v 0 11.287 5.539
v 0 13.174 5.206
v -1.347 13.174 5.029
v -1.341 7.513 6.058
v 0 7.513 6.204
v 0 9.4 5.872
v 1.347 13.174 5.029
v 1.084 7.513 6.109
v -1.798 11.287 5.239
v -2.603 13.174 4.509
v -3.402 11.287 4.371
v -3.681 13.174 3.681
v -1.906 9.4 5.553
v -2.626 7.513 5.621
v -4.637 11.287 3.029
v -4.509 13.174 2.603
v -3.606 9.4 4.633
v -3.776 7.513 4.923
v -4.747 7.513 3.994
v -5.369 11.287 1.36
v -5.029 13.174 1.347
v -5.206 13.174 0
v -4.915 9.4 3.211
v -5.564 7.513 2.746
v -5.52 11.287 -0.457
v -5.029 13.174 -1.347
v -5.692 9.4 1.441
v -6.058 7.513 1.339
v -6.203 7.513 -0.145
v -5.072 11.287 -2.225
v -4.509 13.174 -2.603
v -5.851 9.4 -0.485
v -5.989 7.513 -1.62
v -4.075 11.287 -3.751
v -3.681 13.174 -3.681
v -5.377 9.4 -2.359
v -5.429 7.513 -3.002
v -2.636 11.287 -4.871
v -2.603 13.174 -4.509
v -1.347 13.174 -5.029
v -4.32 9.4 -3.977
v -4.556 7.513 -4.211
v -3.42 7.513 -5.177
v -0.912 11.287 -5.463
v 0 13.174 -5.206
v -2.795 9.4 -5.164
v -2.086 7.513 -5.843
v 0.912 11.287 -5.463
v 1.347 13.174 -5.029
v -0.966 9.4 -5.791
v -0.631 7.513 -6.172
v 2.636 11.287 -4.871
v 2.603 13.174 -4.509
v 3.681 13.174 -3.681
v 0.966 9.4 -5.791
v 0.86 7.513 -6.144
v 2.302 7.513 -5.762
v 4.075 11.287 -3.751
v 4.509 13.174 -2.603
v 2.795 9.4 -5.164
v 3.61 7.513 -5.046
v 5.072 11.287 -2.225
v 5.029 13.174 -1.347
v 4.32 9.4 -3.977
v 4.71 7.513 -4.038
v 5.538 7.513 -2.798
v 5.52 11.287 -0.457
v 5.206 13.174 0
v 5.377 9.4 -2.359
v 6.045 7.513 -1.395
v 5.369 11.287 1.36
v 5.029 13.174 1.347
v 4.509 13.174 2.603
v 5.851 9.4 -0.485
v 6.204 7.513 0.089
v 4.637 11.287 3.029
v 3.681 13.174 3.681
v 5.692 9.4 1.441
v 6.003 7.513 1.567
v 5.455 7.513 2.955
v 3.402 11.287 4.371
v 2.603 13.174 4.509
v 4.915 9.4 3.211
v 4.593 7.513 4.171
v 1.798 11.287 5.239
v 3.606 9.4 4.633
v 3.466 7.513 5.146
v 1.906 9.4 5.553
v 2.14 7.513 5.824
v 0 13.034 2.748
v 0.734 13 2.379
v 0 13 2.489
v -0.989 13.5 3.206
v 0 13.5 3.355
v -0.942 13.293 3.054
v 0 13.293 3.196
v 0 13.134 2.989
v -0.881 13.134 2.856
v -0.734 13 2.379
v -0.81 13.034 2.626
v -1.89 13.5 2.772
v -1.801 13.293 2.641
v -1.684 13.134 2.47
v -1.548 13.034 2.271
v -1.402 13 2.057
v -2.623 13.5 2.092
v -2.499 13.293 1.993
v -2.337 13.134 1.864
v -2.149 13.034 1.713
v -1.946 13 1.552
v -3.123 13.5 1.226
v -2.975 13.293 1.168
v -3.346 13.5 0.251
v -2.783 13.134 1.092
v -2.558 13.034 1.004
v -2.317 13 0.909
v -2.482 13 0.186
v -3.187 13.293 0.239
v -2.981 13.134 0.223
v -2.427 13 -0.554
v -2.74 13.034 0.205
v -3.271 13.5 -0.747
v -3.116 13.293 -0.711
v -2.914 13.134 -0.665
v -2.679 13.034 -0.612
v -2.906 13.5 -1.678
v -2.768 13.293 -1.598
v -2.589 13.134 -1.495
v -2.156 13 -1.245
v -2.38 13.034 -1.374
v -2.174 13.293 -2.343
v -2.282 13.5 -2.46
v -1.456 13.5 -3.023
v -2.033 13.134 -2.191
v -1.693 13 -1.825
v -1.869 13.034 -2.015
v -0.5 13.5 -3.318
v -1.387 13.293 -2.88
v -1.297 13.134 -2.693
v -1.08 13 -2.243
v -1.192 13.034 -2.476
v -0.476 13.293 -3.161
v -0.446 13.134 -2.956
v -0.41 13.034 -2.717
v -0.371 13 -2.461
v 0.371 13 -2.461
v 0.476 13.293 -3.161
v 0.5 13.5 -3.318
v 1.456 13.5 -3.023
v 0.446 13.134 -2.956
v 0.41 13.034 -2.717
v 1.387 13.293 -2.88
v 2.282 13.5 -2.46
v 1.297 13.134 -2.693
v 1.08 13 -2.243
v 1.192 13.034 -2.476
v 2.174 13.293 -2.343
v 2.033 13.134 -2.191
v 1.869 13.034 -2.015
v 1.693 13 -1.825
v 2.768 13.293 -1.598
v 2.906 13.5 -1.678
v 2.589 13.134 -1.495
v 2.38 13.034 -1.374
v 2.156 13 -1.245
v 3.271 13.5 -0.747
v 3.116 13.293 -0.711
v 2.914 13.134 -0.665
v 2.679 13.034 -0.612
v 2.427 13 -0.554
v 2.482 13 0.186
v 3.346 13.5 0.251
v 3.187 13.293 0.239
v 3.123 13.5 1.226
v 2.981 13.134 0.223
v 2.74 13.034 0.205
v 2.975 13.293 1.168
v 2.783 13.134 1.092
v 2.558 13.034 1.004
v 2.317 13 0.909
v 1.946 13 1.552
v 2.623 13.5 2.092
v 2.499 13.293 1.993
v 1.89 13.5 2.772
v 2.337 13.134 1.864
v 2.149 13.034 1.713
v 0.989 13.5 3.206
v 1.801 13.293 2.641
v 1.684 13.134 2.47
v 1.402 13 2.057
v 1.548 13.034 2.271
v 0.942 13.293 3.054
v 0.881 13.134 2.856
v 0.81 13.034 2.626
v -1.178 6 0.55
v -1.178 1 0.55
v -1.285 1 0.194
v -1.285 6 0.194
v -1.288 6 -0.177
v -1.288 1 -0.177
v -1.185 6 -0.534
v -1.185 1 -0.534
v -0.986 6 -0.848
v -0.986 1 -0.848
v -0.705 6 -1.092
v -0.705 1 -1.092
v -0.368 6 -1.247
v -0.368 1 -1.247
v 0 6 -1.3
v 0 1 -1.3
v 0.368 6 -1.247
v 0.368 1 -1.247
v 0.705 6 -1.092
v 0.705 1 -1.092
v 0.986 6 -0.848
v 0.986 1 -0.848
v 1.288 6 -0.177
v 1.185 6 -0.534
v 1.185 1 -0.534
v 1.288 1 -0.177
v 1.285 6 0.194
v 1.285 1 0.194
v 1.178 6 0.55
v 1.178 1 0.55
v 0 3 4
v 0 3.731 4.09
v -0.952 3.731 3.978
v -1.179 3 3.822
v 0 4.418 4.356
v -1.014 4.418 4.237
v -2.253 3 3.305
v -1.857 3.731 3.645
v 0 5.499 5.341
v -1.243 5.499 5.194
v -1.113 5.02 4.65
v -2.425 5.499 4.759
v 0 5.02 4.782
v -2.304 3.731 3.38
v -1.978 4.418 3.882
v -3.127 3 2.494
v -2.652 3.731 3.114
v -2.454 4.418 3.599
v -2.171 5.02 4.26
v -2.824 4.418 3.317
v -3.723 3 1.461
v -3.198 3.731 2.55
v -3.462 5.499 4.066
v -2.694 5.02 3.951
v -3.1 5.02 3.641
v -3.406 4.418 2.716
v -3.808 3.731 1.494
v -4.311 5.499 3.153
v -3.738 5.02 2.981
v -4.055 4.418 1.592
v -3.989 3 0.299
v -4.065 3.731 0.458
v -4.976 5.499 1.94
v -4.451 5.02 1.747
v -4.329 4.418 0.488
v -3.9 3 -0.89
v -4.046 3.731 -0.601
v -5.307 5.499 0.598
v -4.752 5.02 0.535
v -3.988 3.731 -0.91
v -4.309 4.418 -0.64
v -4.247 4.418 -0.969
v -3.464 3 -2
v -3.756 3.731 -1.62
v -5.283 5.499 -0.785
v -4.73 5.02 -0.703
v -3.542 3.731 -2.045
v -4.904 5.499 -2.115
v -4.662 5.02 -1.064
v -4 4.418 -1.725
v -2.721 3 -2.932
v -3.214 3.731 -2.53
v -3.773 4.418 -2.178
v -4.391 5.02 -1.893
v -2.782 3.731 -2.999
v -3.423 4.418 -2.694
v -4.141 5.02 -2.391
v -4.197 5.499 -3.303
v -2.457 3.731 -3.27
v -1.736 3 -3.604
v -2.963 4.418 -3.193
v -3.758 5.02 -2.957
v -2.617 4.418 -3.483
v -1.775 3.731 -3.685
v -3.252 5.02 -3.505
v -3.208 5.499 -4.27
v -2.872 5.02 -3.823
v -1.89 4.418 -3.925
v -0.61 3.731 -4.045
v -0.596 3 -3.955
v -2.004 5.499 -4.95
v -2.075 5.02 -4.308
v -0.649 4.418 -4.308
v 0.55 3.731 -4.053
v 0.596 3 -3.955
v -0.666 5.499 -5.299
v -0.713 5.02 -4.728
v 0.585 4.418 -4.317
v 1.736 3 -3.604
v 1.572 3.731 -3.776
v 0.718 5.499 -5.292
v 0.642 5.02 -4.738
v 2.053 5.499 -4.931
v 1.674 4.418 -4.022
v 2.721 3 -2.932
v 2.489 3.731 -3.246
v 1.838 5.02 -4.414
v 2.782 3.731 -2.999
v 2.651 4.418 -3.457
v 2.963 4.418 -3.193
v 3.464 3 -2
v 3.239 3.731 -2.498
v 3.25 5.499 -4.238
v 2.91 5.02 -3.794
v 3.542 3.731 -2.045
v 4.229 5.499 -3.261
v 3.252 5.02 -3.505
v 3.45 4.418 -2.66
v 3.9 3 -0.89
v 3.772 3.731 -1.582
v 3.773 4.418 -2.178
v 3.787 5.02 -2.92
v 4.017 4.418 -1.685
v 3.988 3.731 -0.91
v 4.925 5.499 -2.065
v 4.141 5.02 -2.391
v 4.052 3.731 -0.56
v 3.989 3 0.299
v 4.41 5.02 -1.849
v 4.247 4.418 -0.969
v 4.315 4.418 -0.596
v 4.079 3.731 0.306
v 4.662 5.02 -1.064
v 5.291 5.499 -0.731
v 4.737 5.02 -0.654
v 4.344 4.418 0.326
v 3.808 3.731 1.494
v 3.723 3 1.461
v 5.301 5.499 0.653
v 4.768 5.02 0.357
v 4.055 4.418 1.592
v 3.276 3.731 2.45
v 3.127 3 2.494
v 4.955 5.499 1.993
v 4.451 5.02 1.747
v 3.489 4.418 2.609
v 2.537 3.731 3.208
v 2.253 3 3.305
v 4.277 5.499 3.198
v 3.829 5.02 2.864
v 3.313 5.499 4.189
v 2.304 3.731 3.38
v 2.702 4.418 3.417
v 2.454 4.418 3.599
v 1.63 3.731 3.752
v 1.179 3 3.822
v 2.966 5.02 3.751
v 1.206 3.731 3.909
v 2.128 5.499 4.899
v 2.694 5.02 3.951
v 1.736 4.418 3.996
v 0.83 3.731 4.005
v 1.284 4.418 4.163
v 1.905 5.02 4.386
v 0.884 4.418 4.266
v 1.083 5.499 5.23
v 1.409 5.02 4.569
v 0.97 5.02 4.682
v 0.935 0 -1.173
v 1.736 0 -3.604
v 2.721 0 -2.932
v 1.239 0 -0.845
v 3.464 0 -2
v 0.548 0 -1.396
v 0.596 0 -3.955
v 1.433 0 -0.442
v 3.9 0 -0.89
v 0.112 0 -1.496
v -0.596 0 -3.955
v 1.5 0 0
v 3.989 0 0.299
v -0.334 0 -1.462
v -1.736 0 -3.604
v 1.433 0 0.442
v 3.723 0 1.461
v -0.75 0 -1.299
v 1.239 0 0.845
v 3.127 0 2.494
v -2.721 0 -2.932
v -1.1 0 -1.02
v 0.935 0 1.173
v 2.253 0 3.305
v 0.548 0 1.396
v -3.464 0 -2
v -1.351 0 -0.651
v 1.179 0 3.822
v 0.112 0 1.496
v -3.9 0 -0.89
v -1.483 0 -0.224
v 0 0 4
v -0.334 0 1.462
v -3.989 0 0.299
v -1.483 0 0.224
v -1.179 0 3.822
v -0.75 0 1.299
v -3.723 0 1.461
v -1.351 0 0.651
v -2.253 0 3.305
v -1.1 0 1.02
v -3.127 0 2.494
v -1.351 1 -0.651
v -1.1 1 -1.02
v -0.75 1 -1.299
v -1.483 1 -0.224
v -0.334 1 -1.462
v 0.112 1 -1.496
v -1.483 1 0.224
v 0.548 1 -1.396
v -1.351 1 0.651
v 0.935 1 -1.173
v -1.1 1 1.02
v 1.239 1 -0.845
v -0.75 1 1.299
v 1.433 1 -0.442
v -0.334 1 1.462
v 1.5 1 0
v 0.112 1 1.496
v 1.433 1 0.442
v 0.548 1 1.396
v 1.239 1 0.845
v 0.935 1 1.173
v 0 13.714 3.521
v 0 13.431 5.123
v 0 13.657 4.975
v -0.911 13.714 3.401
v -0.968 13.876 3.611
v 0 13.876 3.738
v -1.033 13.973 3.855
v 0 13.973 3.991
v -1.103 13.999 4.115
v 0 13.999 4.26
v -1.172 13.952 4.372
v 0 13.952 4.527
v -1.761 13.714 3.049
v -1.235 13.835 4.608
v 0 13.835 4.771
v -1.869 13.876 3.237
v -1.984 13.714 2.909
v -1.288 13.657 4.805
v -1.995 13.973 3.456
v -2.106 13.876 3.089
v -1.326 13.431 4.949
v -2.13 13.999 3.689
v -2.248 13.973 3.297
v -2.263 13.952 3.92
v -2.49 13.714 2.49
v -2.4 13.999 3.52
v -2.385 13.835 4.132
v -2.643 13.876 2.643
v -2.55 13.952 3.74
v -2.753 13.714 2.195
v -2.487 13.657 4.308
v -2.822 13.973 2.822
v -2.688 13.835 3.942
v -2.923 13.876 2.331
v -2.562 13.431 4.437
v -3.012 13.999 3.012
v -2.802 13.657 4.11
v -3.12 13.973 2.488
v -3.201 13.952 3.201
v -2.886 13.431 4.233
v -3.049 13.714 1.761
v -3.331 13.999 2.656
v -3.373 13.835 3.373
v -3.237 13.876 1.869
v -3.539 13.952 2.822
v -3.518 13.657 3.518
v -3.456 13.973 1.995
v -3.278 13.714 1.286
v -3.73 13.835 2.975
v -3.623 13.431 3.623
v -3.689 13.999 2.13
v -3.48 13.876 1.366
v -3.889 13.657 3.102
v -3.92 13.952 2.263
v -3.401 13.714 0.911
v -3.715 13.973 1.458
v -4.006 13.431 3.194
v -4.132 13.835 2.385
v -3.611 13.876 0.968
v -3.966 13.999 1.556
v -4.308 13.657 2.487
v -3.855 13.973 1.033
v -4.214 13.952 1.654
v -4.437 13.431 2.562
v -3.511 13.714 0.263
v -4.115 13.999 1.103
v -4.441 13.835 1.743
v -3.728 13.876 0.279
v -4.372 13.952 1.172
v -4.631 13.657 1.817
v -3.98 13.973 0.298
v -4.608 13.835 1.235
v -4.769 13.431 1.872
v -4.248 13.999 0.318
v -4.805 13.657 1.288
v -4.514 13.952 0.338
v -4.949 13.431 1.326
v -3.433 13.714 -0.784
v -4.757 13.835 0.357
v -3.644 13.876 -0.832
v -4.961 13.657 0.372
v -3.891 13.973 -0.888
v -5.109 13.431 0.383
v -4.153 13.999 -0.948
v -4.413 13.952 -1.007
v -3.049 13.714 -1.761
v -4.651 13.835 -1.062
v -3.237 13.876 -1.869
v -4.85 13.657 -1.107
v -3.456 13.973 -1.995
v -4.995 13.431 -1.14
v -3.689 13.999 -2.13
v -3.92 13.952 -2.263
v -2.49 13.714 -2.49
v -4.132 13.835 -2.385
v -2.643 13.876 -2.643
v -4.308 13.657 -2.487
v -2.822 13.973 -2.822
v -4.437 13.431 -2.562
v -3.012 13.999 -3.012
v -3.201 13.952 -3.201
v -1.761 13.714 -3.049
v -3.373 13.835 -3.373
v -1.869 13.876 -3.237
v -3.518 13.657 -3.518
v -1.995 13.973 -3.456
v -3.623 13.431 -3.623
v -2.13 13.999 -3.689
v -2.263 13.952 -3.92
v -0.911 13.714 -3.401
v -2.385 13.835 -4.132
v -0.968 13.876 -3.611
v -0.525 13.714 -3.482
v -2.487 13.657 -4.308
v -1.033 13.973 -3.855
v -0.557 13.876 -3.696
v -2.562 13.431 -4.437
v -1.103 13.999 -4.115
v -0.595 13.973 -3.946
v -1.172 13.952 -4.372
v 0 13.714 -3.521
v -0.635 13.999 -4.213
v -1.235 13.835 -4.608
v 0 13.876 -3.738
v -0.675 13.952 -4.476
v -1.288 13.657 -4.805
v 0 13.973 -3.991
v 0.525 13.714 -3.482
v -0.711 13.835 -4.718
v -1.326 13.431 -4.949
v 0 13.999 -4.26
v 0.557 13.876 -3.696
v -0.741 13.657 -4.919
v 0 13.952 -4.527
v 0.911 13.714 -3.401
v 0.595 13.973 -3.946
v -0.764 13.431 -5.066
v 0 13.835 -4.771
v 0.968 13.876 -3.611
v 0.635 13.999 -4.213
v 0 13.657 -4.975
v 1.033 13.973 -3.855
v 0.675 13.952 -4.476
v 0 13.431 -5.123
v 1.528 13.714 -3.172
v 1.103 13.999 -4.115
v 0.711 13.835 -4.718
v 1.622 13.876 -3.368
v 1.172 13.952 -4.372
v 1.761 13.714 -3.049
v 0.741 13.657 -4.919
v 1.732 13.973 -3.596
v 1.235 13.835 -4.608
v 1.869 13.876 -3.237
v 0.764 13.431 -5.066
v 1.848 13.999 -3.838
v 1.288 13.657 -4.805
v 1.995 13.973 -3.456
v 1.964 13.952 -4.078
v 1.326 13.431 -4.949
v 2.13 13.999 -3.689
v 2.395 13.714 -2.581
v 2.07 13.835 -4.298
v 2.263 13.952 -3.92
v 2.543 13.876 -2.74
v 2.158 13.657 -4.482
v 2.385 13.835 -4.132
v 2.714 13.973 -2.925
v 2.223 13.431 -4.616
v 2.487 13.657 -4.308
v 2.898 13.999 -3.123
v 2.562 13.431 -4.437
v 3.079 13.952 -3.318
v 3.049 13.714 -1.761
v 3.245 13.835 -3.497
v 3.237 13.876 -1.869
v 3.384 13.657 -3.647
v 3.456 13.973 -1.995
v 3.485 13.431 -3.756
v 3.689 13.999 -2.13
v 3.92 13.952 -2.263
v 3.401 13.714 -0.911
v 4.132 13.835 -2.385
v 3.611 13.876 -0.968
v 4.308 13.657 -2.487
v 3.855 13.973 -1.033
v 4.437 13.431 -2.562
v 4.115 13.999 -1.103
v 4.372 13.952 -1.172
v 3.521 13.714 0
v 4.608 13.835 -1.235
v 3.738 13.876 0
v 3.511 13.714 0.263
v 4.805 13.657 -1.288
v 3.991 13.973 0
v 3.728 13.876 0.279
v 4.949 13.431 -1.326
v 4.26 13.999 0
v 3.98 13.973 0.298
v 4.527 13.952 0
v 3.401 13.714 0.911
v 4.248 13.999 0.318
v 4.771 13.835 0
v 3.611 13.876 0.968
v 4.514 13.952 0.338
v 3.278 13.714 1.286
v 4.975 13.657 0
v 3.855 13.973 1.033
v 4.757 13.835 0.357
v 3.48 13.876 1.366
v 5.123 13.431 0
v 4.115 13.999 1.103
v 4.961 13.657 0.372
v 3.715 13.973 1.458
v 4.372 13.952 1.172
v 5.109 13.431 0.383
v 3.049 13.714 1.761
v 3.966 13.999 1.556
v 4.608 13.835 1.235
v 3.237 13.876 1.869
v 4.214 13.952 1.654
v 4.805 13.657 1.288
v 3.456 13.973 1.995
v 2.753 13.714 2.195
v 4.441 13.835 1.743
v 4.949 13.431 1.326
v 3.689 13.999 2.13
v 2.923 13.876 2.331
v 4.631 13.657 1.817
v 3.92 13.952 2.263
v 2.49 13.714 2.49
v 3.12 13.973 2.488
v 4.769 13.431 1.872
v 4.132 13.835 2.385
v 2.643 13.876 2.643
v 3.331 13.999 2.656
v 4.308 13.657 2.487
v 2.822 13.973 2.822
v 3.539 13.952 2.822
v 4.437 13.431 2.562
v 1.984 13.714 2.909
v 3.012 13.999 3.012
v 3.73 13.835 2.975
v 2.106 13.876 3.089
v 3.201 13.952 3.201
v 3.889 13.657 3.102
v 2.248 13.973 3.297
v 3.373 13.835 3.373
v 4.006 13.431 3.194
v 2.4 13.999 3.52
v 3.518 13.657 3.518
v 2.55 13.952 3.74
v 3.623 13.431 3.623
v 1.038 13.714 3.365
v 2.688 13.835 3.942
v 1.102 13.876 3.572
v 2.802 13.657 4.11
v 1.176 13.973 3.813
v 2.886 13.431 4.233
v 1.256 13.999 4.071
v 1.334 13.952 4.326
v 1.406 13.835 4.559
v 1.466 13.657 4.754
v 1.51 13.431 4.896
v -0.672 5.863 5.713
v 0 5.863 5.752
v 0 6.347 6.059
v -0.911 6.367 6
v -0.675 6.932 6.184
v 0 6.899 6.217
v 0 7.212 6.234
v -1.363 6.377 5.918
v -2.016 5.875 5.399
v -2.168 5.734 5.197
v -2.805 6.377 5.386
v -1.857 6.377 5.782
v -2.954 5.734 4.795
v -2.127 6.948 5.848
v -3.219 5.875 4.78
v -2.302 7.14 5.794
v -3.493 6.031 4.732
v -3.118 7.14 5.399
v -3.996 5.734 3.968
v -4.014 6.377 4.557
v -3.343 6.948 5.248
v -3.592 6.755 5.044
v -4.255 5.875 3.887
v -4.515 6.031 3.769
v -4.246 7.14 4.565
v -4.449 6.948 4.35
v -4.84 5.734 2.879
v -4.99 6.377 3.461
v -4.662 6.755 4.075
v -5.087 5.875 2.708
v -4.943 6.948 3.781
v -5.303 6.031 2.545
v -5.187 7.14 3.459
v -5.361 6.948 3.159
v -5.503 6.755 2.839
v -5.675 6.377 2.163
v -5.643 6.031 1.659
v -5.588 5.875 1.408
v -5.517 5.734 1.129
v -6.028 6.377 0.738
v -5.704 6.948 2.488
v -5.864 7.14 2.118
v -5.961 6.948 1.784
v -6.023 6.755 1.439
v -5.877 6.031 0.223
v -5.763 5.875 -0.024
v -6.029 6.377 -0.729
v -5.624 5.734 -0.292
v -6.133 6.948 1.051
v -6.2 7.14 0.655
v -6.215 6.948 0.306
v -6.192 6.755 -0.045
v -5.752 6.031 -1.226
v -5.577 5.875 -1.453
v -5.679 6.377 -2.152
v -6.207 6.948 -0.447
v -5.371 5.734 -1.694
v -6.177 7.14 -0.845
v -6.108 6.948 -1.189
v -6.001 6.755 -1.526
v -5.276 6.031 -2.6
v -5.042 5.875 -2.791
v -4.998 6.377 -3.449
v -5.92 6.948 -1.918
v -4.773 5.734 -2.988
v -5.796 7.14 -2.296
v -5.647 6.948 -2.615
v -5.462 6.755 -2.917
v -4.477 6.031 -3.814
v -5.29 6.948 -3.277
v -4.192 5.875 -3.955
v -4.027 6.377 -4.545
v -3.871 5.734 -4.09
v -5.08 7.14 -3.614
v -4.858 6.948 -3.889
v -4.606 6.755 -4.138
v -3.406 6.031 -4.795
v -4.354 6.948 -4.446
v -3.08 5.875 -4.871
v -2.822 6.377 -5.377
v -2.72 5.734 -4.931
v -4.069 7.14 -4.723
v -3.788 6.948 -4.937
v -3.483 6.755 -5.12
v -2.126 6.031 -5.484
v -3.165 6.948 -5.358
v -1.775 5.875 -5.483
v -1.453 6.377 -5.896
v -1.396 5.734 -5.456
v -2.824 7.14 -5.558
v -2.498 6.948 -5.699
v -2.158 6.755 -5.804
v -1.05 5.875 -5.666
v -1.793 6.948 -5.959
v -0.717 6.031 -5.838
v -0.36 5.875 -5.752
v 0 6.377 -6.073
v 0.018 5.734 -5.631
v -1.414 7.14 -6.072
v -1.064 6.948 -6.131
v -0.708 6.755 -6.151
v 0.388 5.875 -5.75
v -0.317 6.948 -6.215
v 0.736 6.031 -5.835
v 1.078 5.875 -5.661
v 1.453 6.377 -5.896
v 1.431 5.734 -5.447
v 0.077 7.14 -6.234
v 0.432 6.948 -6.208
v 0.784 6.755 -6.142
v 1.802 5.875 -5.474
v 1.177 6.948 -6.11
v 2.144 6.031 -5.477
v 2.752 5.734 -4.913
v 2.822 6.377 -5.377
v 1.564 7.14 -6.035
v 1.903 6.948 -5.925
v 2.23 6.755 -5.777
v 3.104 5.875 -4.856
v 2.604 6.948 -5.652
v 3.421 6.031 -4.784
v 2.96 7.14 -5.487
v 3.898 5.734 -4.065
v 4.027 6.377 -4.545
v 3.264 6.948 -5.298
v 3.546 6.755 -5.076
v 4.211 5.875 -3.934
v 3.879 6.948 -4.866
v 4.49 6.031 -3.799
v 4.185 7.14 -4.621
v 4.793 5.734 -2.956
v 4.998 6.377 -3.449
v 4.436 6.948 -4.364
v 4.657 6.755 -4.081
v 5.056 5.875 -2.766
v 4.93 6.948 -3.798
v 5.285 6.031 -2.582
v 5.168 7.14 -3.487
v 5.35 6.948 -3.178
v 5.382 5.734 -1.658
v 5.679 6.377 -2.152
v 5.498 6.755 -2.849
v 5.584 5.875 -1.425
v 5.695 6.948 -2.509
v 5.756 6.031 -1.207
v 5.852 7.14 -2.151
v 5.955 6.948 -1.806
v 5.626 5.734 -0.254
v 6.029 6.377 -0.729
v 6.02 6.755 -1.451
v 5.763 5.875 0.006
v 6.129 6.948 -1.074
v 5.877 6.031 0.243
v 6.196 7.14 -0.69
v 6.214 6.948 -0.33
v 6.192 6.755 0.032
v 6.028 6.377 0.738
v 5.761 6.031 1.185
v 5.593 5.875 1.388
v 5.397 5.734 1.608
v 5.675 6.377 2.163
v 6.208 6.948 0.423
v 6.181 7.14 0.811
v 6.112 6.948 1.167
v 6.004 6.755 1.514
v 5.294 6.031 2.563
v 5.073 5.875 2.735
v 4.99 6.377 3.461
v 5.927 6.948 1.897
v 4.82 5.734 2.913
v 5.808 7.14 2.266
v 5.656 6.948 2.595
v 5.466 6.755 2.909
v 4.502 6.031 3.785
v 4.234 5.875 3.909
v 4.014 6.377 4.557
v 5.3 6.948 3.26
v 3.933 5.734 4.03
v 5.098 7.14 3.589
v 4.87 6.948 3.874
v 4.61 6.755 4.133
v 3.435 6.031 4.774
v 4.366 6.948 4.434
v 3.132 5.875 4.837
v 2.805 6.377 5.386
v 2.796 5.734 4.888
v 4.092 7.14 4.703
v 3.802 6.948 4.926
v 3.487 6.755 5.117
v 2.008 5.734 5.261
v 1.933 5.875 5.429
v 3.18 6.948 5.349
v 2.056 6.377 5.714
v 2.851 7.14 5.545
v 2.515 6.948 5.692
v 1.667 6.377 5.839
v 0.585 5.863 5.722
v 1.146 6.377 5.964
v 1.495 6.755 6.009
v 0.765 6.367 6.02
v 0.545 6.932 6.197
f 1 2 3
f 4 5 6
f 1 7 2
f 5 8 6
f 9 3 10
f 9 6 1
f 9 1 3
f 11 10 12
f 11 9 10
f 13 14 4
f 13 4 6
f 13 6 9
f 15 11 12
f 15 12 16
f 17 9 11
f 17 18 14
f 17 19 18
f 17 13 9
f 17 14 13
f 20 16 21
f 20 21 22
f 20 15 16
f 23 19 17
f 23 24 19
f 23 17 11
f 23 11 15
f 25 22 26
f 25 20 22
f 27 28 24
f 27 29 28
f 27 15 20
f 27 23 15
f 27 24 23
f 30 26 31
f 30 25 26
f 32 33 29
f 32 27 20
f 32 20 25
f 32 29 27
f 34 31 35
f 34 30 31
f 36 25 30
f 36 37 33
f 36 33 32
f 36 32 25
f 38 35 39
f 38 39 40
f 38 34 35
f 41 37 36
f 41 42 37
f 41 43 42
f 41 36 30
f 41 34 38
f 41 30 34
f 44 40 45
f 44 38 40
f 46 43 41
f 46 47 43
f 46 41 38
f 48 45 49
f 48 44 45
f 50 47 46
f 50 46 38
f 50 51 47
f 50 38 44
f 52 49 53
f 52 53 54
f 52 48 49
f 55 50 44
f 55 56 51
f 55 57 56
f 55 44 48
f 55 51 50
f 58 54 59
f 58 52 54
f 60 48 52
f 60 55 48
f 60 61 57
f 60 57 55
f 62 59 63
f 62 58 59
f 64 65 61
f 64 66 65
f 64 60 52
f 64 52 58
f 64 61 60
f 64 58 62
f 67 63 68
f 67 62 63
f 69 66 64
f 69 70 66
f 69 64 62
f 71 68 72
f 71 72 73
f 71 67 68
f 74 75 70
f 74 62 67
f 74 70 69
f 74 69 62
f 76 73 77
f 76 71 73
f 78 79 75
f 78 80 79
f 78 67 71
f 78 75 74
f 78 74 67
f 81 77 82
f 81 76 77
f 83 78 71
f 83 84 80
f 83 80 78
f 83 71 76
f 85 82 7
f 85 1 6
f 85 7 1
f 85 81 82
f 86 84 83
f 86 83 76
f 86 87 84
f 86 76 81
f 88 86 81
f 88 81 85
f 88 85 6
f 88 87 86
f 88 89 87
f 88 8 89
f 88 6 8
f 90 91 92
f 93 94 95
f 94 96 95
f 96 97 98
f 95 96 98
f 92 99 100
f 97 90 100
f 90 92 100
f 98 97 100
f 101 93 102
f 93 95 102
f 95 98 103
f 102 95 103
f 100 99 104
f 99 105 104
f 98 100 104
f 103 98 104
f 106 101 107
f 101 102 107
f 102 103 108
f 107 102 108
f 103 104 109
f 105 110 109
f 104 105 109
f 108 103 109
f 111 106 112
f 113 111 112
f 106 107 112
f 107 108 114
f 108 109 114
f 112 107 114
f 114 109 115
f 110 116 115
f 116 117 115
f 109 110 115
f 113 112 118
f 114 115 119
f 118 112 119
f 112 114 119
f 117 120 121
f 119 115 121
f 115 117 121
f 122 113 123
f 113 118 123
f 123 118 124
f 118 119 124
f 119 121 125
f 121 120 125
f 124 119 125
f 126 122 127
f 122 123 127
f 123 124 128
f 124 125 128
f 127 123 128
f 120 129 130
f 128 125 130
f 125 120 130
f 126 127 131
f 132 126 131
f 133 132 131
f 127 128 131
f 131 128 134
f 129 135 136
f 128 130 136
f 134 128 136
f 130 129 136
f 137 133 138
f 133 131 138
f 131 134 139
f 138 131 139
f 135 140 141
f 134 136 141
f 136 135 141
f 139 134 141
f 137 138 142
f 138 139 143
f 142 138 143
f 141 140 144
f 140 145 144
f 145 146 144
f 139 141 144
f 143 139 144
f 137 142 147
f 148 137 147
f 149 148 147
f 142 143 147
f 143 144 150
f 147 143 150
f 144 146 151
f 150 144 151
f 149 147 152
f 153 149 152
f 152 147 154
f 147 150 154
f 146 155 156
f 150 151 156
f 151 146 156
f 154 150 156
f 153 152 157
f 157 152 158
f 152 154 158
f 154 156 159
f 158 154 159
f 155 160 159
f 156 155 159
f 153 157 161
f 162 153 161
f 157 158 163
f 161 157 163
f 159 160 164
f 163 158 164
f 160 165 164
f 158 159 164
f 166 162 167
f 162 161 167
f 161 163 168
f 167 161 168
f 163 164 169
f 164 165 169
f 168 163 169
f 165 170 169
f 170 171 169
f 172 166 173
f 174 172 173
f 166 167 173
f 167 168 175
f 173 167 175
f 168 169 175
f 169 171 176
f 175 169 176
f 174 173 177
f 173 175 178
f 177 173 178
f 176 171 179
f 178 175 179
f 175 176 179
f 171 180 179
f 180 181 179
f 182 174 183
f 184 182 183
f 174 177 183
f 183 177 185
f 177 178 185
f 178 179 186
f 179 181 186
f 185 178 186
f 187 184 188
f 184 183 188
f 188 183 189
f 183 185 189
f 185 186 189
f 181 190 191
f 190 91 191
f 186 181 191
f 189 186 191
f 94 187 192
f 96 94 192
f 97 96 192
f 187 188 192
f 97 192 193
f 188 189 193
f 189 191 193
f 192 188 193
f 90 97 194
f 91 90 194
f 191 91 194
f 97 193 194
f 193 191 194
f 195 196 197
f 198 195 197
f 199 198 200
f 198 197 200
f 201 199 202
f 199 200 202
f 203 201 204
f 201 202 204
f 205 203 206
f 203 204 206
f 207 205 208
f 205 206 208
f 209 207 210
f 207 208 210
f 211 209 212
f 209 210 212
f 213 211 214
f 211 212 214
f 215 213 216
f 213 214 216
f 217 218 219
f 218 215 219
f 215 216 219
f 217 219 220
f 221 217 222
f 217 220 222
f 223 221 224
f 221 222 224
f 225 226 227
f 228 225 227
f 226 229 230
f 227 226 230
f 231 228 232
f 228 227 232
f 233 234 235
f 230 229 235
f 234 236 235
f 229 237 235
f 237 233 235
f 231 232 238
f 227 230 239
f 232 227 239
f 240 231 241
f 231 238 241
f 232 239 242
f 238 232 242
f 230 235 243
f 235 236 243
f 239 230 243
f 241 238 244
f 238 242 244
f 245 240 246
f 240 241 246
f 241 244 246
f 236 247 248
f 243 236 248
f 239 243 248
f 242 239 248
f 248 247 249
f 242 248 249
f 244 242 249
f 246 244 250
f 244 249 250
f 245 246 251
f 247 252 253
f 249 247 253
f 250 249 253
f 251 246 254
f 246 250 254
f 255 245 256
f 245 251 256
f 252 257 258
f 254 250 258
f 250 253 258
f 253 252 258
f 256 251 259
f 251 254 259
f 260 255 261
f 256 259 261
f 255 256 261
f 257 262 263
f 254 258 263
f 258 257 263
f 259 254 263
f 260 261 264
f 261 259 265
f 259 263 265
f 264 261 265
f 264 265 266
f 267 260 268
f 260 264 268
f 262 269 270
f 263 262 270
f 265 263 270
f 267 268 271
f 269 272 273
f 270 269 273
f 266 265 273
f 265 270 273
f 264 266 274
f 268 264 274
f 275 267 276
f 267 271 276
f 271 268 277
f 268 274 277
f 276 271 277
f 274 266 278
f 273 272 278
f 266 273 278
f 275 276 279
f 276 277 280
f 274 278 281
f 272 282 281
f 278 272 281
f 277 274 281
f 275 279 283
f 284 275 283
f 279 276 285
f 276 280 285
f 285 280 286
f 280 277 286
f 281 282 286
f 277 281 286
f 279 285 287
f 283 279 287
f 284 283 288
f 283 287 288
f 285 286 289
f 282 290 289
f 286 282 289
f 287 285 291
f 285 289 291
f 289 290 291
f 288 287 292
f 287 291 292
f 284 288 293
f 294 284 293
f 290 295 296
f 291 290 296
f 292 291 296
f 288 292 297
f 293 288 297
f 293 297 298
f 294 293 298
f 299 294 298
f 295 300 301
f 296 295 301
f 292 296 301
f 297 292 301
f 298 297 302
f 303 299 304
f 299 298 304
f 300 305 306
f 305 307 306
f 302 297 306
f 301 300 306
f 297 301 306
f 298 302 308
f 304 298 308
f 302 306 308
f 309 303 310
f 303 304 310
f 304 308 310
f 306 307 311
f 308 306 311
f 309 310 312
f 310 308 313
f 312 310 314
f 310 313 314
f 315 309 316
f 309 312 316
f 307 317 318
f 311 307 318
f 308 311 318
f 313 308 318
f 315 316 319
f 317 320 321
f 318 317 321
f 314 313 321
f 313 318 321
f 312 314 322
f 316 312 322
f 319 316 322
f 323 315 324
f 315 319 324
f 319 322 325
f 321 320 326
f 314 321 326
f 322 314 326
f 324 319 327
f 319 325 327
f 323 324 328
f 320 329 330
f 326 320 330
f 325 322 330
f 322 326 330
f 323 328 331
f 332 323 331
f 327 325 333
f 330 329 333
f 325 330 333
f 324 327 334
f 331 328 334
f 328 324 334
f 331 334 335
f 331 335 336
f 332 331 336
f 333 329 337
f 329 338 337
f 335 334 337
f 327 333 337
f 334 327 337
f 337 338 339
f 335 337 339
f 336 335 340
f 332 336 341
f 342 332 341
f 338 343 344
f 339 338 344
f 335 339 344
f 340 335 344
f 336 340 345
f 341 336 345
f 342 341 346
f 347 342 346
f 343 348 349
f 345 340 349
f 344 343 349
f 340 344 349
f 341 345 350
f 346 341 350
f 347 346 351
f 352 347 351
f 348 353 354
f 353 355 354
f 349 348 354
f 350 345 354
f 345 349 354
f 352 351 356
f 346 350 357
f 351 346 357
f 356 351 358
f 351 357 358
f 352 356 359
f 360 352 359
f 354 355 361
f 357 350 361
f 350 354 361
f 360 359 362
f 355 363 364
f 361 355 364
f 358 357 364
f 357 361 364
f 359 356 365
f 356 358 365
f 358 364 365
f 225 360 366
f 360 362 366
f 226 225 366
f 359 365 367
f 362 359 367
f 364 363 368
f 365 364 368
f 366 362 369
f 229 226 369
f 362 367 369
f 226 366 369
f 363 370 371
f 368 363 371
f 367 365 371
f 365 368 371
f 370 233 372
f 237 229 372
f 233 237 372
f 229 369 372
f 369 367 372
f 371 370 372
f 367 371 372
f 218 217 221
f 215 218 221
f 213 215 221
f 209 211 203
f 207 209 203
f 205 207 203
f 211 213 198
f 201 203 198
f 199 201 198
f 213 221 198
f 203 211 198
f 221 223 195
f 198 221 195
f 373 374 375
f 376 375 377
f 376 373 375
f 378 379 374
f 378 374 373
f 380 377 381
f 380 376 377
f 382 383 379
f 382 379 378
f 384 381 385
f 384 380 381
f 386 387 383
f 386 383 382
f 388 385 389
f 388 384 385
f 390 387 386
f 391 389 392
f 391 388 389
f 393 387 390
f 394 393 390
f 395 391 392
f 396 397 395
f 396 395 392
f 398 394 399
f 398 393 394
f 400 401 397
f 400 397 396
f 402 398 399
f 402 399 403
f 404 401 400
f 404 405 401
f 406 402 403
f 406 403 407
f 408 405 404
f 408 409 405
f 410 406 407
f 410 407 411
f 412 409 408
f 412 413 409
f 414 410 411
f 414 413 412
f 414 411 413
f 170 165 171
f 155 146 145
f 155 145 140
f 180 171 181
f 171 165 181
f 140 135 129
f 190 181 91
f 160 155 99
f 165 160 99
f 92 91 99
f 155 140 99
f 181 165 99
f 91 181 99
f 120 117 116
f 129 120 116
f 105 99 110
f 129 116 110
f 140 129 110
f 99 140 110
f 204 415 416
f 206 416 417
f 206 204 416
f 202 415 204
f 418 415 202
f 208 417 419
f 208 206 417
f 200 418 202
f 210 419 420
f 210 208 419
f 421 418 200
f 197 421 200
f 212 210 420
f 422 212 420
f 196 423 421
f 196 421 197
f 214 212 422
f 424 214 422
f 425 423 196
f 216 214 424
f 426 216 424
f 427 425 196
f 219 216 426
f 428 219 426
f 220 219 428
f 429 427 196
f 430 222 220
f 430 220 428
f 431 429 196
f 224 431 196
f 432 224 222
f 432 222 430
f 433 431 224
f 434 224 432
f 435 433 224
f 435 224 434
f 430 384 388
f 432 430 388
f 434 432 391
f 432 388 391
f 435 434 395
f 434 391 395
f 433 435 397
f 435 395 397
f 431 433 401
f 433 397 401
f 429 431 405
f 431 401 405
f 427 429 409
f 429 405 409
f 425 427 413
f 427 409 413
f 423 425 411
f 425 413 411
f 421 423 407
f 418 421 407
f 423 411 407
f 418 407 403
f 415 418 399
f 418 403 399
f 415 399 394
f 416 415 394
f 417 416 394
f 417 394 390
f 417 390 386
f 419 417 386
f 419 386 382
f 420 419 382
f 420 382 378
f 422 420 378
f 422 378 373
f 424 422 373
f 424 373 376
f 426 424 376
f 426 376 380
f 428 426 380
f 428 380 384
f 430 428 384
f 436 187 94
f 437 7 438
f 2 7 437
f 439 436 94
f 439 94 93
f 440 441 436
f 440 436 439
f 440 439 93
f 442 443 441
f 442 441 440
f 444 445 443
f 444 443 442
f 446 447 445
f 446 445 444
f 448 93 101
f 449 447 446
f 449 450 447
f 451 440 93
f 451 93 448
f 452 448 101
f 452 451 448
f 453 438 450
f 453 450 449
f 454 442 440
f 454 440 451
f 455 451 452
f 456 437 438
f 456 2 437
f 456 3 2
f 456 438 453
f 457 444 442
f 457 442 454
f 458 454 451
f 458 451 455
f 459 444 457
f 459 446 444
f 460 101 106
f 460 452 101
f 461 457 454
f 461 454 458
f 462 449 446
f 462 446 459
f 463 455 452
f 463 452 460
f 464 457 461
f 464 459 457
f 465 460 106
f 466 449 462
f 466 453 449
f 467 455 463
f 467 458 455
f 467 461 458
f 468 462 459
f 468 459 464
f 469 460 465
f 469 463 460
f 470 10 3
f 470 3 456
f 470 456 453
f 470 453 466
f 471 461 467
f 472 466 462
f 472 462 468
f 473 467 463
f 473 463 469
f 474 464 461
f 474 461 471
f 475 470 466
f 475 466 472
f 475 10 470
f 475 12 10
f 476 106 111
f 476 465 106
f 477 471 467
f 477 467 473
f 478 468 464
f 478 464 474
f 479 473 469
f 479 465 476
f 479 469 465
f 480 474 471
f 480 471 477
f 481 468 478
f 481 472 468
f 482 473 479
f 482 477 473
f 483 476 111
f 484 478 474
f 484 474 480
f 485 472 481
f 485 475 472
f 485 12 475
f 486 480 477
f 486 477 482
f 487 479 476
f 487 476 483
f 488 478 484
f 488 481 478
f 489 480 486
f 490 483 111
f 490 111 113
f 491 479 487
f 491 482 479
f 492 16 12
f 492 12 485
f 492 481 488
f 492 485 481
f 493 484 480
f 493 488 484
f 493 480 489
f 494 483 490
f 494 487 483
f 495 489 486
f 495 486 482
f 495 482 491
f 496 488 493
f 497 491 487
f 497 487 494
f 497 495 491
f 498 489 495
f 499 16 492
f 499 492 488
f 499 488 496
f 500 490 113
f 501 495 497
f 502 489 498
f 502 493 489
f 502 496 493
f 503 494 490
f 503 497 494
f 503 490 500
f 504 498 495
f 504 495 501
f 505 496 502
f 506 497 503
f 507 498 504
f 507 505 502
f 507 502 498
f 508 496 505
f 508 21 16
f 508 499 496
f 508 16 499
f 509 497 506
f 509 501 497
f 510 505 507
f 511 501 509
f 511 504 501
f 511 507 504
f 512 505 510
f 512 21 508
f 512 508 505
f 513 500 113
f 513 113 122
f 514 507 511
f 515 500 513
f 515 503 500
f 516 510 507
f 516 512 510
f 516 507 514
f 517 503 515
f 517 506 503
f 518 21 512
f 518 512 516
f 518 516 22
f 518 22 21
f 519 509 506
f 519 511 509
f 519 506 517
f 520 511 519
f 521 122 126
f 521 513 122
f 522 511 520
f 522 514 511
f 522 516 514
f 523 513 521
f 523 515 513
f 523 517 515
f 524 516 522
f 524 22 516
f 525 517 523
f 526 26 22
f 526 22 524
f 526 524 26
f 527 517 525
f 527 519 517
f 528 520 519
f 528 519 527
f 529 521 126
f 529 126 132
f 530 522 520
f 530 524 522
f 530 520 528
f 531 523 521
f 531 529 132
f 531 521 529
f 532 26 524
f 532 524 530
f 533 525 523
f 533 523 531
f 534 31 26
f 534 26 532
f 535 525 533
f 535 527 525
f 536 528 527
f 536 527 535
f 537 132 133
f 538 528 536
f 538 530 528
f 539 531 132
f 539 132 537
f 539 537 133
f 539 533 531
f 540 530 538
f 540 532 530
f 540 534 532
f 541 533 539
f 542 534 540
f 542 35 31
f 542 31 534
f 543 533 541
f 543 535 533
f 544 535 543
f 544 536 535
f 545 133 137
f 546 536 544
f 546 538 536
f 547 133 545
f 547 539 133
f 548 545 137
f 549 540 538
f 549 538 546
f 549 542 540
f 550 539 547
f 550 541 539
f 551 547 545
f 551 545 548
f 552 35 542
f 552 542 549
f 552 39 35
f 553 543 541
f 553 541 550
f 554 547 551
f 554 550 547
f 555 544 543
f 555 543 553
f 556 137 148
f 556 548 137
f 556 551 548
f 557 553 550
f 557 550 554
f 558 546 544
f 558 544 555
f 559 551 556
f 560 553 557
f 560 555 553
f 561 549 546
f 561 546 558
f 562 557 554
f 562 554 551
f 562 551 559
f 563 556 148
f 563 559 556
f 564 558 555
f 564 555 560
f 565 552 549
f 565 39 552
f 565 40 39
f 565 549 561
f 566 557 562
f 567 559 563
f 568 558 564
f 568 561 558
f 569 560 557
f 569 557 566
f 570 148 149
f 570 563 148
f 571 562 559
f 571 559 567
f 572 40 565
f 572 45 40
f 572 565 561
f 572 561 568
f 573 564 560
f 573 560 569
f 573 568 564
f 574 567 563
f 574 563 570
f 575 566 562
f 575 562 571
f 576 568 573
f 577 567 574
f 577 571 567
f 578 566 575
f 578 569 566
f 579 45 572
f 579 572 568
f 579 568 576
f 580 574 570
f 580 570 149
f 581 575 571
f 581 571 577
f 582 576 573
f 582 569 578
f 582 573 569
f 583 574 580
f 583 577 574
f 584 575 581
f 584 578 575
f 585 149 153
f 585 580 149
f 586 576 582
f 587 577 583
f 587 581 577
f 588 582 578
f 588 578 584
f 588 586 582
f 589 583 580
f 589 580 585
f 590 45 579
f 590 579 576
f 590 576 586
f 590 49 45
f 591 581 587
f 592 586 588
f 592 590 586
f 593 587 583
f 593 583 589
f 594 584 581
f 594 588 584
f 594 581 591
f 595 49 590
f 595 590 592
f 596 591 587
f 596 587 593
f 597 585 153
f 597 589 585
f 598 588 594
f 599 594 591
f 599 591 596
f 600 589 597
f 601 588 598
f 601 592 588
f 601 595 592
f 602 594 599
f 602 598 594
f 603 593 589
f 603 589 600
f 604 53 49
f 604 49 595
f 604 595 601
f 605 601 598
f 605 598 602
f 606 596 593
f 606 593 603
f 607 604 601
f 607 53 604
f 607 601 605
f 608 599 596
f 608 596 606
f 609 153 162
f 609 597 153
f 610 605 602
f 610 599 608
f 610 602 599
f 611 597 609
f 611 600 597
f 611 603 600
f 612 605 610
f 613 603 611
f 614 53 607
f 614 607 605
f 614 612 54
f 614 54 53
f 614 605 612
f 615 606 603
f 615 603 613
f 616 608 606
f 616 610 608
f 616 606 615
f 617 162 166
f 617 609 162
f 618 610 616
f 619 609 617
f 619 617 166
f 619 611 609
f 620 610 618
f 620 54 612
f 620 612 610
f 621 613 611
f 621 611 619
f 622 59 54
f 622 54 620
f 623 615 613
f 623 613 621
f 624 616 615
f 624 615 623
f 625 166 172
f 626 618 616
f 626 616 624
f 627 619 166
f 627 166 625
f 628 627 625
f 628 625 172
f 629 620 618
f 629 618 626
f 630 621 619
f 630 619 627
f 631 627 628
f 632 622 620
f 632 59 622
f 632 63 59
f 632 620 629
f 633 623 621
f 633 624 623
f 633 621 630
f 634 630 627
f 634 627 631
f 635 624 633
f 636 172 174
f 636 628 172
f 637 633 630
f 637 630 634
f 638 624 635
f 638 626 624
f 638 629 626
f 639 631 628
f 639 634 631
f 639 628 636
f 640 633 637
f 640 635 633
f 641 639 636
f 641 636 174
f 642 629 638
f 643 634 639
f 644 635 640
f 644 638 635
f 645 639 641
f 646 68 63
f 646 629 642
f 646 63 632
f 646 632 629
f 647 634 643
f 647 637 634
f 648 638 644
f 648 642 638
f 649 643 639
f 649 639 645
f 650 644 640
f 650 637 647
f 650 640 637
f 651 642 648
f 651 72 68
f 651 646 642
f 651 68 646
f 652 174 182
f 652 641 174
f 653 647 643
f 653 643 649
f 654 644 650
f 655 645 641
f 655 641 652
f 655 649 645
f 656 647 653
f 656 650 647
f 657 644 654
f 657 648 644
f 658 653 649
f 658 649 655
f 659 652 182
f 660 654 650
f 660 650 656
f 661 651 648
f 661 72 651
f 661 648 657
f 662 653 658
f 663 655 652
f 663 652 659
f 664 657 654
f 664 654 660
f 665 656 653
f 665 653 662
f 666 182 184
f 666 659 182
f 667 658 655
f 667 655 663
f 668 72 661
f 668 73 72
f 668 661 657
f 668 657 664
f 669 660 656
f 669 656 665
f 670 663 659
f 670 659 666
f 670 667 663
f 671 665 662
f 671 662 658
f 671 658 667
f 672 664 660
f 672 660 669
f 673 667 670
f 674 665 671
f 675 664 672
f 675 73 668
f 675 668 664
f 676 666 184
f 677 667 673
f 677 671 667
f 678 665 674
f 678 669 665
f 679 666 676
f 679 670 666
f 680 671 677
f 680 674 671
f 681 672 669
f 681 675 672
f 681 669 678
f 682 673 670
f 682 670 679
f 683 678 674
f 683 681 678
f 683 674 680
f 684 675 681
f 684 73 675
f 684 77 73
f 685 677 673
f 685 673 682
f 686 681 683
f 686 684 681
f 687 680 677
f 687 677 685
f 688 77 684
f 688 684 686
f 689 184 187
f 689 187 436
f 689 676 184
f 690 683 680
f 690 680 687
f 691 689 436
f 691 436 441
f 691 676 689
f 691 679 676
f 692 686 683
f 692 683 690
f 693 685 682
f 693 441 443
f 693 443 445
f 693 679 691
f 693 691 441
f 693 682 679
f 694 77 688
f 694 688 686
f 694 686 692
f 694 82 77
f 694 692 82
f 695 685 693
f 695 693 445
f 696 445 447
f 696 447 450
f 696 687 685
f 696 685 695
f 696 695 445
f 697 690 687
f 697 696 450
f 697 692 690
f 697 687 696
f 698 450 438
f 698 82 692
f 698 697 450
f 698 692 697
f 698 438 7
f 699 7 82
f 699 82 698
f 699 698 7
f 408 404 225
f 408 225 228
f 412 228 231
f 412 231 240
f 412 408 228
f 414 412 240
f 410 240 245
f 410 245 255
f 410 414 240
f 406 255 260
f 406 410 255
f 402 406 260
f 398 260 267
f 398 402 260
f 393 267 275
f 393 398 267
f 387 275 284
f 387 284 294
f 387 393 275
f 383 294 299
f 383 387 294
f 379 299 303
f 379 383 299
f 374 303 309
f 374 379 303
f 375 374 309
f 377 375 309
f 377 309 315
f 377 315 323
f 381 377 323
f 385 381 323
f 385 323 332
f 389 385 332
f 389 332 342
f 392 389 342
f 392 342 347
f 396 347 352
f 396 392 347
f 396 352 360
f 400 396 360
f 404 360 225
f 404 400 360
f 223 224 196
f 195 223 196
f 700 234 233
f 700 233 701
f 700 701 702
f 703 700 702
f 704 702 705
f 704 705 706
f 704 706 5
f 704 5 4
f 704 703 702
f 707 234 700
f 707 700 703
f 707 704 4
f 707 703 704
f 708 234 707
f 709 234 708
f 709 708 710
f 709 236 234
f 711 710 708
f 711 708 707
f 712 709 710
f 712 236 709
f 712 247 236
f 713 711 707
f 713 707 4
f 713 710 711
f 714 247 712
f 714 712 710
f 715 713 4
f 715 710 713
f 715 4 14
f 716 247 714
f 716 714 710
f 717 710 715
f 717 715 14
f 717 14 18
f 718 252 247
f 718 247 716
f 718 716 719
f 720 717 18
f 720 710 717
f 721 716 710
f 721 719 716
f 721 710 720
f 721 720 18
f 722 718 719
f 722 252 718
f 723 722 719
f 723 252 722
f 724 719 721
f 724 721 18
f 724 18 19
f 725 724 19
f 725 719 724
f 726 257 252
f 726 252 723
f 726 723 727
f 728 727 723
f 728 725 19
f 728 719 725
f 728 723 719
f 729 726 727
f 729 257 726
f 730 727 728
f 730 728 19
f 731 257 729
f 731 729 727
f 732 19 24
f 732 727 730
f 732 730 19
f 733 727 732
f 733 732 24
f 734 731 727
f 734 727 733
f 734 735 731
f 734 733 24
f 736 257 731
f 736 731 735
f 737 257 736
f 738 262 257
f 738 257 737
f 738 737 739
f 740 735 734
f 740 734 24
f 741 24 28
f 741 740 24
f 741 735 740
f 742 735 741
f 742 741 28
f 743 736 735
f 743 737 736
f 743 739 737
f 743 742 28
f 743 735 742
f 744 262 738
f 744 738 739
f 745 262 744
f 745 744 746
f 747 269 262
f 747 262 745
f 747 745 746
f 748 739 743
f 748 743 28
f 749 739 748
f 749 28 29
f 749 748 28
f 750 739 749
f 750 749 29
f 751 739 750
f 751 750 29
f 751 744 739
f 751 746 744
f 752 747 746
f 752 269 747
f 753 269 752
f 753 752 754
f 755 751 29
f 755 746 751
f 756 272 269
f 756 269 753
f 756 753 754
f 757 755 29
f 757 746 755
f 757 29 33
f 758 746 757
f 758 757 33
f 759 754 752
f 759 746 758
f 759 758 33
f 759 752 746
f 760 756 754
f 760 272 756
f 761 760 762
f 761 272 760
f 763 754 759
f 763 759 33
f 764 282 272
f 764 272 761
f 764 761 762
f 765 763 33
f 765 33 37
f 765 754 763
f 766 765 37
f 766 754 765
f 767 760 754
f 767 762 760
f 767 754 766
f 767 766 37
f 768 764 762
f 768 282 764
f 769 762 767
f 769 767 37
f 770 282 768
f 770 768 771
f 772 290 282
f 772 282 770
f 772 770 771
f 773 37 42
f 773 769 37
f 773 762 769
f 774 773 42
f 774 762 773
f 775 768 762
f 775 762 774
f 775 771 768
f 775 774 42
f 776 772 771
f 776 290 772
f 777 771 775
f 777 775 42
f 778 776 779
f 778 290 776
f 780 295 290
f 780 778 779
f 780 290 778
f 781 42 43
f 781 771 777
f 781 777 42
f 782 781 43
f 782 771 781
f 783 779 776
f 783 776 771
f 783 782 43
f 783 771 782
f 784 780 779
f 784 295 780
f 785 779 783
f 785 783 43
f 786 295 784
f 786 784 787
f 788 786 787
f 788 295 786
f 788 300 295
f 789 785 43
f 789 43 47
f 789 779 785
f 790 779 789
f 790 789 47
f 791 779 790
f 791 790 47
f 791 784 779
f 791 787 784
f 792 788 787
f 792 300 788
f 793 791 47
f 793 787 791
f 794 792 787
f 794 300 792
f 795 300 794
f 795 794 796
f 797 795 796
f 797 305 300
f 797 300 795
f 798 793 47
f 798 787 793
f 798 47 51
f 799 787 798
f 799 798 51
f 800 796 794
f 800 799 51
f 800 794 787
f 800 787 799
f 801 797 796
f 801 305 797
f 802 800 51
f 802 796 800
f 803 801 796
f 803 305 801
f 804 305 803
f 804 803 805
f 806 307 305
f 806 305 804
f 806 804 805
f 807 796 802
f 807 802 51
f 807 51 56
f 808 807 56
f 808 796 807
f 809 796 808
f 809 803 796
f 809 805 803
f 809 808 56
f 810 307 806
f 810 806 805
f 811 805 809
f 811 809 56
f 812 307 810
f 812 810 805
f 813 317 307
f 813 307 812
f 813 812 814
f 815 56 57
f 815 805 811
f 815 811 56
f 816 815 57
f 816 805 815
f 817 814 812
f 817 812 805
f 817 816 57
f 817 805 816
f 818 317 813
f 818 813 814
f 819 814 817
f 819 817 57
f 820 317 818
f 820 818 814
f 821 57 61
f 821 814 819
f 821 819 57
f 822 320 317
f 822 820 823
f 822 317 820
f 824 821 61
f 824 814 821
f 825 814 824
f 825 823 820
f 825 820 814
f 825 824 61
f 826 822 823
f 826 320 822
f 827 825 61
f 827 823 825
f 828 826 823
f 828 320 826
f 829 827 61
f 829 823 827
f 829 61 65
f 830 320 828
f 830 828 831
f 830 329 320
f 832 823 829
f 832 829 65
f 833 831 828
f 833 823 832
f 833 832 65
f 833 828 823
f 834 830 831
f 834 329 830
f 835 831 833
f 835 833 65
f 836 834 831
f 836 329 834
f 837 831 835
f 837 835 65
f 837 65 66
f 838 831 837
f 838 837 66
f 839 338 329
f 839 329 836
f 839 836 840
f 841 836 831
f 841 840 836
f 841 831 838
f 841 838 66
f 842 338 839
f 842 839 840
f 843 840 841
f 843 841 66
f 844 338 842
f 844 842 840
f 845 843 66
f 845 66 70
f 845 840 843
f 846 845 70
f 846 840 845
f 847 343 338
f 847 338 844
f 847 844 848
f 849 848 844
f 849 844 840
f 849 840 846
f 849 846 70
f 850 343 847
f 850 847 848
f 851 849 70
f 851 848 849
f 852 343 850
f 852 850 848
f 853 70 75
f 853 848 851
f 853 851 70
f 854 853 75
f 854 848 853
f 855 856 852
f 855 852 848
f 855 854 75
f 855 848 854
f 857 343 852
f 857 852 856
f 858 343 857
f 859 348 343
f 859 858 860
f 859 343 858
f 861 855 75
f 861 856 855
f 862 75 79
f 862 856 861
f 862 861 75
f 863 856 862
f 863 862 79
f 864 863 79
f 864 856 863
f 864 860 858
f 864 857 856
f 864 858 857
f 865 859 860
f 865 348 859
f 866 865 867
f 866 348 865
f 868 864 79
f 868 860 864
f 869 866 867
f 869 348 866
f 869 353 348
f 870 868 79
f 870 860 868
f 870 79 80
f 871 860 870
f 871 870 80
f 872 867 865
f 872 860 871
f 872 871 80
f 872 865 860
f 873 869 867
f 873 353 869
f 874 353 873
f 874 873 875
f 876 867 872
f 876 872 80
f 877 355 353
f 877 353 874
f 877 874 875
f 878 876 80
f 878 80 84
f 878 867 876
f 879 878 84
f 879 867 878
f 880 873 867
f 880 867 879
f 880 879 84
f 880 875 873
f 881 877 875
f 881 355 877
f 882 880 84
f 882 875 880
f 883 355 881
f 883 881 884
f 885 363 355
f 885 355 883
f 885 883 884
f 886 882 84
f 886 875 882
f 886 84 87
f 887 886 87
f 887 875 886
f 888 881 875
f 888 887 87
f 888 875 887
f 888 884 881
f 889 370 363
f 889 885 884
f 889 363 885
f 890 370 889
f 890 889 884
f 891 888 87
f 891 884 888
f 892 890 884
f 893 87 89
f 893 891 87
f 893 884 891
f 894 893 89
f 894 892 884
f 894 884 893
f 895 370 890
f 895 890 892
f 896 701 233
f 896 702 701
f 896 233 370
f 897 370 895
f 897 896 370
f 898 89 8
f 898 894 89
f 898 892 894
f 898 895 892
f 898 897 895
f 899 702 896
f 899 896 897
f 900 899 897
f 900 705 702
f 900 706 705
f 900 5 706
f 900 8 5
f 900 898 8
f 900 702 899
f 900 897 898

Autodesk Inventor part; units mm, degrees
ref_plane "YZ Plane" through (0, 0, 0) normal (1, 0, 0) x (0, 1, 0)
ref_plane "XZ Plane" through (0, 0, 0) normal (0, 1, 0) x (-1, 0, 0)
ref_plane "XY Plane" through (0, 0, 0) normal (0, 0, 1) x (1, 0, 0)
sketch "Skizze2" plane through (0, 0, 0) normal (1, 0, 0) x (0, 1, 0)
  line L0 (13, 0) -> (0, 0)
  line L1 (3, 4) -> (0, 4)
  line L2 (0, 4) -> (0, 0)
  line L3 (5.9544, 6.4791) -> (13.1736, 5.2061)
  line L4 (13.1736, 5.2061) -> (5.9544, 6.4791)
  arc A0 (3, 4) -> (5.9544, 6.4791) centre (3, 7) ccw
  arc A1 (13.5, 3.3553) -> (13.1736, 5.2061) centre (13, 4.2213) ccw
  arc A2 (13.5, 3.3553) -> (13, 2.4893) centre (14, 2.4893) ccw
  line L5 (13, 2.4893) -> (13, 0)
  dimension "d3" = 80
  dimension "d4" = 4
  dimension "d5" = 13
  dimension "d7" = 3
  dimension "d8" = 1
  dimension "d9" = 3
  dimension "d10" = 0
revolve "Umdrehung1" add sketch "Skizze2" angle 360 about axis through (0, 13, 0) along (0, -1, 0)
sketch "Skizze1" plane through (0, 0, 0) normal (0, 1, 0) x (-1, 0, 0)
  arc A0 (-1.1779, 0.55) -> (1.1779, 0.55) centre (0, 0) ccw
  line L0 (-1.1779, 0.55) -> (1.1779, 0.55)
  dimension "d0" = 1.3
  dimension "d1" = 0.55
extrude "Extrusion1" cut sketch "Skizze1" along normal blind 6
sketch "Skizze3" plane through (0, 0, 0) normal (0, -1, 0) x (1, 0, 0)
  arc A0 (-1.1779, 0.55) -> (1.1779, 0.55) centre (0, 0) ccw projected
  circle A1 centre (0, 0) radius 1.5
  point P0 (0, 0)
  dimension "d14" = 3
extrude "Extrusion2" cut sketch "Skizze3" against normal blind 1
fillet "Rundung1" radius 2 1 edges at (0, 5.9544, -6.4791)
properties part number "_3D-Druck"
